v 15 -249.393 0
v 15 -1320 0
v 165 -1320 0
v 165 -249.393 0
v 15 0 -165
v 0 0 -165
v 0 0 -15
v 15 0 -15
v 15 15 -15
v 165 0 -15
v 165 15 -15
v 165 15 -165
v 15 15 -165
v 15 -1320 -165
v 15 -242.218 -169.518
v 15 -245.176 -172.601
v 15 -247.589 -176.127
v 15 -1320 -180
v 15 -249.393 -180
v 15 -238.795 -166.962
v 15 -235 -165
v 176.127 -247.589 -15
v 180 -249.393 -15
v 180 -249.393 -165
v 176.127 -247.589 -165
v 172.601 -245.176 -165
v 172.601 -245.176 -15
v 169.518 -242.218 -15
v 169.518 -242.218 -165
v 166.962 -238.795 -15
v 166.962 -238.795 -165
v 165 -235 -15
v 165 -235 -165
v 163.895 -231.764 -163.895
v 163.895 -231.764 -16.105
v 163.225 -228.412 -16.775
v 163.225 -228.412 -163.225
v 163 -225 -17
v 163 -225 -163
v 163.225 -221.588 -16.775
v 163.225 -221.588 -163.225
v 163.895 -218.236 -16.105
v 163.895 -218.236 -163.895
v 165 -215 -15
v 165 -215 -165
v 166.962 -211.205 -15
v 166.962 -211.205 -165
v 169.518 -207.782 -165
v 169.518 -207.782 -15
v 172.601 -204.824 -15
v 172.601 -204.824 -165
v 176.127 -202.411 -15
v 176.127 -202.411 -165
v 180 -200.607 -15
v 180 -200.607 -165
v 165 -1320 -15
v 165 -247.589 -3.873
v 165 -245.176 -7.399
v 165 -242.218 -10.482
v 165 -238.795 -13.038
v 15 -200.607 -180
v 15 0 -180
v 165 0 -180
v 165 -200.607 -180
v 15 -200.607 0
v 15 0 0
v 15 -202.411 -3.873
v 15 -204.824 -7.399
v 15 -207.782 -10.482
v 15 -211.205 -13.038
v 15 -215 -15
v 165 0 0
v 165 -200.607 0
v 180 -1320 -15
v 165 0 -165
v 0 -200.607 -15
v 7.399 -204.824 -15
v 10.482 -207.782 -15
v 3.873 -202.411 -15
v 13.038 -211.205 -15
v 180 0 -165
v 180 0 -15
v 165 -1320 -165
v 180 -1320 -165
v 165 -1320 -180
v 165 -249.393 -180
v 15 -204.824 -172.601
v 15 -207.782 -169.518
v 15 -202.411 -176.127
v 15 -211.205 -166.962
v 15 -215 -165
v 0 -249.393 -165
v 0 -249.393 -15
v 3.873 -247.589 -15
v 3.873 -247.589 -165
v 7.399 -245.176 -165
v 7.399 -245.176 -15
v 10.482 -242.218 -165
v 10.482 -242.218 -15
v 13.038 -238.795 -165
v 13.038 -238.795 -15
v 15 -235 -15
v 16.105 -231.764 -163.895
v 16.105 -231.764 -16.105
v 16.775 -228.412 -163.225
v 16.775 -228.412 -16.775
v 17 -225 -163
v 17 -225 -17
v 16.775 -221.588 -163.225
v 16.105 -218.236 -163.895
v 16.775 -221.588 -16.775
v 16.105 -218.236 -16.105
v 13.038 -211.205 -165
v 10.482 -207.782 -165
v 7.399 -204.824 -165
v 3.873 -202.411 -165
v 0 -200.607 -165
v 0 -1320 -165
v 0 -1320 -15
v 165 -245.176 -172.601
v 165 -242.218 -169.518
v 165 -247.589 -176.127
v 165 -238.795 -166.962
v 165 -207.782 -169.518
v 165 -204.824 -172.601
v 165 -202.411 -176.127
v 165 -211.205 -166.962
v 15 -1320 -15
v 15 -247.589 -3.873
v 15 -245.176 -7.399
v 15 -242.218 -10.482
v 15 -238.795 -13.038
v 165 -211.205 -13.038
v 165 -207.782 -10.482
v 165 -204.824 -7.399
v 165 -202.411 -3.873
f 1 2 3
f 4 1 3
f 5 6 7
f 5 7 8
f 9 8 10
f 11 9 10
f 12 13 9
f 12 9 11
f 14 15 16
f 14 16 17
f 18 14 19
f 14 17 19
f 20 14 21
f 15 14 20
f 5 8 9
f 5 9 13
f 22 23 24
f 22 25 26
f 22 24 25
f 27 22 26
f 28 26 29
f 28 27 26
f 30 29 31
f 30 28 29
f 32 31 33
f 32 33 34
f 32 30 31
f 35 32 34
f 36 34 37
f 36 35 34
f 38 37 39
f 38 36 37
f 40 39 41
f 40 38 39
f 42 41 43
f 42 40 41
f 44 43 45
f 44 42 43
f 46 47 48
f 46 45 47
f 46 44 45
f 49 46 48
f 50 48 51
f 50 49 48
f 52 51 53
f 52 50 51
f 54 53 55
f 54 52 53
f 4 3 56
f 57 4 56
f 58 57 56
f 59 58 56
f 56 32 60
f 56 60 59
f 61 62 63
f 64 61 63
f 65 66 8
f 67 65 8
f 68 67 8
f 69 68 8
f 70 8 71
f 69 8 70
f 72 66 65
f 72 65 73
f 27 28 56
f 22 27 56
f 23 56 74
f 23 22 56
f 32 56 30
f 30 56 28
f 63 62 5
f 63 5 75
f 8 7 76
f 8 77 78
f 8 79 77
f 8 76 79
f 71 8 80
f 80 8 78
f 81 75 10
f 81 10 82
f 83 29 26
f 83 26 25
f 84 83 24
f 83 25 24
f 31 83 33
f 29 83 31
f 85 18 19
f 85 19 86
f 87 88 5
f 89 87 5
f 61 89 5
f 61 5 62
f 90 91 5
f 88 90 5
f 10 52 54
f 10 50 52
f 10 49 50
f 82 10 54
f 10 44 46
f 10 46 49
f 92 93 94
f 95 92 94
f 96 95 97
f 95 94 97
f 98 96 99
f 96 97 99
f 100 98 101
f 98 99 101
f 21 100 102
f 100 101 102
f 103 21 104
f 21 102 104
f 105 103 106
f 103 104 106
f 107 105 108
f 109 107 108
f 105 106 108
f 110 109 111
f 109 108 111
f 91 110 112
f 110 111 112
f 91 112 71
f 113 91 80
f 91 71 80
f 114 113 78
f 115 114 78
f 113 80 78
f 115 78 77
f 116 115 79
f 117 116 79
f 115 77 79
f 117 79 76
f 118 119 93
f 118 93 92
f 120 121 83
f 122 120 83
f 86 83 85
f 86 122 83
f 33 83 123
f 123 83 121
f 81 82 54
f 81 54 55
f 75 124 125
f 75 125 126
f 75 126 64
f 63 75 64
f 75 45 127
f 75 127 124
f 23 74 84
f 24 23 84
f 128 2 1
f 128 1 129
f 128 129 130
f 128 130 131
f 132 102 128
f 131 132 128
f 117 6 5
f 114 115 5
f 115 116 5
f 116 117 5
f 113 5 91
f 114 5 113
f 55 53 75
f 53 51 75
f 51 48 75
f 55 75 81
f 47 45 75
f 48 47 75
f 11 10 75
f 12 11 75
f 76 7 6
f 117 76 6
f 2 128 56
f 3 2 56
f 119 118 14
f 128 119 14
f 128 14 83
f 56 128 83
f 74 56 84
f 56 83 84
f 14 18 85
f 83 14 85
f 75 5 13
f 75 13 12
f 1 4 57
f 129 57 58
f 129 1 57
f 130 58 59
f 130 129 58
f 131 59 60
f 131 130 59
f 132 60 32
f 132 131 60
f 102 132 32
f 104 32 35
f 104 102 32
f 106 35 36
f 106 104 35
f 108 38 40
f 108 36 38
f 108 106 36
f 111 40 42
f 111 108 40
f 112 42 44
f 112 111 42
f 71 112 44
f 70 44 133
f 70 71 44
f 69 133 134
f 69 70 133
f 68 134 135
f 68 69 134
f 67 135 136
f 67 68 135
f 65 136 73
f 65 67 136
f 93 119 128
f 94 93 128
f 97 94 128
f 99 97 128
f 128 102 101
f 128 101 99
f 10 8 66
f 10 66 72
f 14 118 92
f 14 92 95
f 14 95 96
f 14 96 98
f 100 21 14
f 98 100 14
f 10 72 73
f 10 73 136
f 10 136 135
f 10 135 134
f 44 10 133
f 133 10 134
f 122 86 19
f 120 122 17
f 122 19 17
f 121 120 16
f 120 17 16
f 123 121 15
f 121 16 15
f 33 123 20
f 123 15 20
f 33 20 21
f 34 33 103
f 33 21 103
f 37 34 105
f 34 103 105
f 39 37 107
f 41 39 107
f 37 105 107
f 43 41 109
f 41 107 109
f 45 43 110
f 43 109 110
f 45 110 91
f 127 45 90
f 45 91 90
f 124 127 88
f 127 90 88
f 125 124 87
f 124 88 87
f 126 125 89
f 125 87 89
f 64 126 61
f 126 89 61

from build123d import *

# Parameters (mm, degrees)
SKETCH_4_W               = 180
SKETCH_4_H               = 180
EXTRUDE_1_DEPTH          = 1320
SKETCH_5_W               = 15
SKETCH_5_H               = 15
CUT_EXTRUDE_1_DEPTH      = 1320
CUT_EXTRUDE_2_DEPTH      = 1
CUT_EXTRUDE_2_DEPTH_BACK = 181
CUT_EXTRUDE_3_DEPTH      = 181
SKETCH_8_W               = 150
SKETCH_8_H               = 150
EXTRUDE_2_DEPTH          = 15


with BuildPart() as part:
    # 草图4 → 凸台-拉伸1 (new body)
    with BuildSketch(Plane(origin=(0, 0, 0), x_dir=(1, 0, 0), z_dir=(0, 1, 0))):
        with Locations((90, 90)):
            Rectangle(SKETCH_4_W, SKETCH_4_H)
    extrude(amount=-EXTRUDE_1_DEPTH)

    # 草图5 → 切除-拉伸1 (cut)
    with BuildSketch(Plane(origin=(0, 0, 0), x_dir=(1, 0, 0), z_dir=(0, 1, 0))):
        with Locations((7.5, 172.5)):
            Rectangle(SKETCH_5_W, SKETCH_5_H)
        with Locations((7.5, 7.5)):
            Rectangle(SKETCH_5_W, SKETCH_5_H)
        with Locations((172.5, 172.5)):
            Rectangle(SKETCH_5_W, SKETCH_5_H)
        with Locations((172.5, 7.5)):
            Rectangle(SKETCH_5_W, SKETCH_5_H)
    extrude(amount=-CUT_EXTRUDE_1_DEPTH, mode=Mode.SUBTRACT)

    # 草图6 → 切除-拉伸2 (cut, two sides)
    with BuildSketch(Plane.XY) as cut_extrude_2_sk:
        with BuildLine():
            Line((0, -200.607378165), (0, -249.392621835))
            ThreePointArc((0, -249.392621835), (17, -225), (0, -200.607378165))
        make_face()
        with BuildLine():
            Line((180, -200.607378165), (180, -249.392621835))
            ThreePointArc((180, -249.392621835), (163, -225), (180, -200.607378165))
        make_face()
    extrude(amount=CUT_EXTRUDE_2_DEPTH, mode=Mode.SUBTRACT)
    extrude(cut_extrude_2_sk.sketch, amount=-CUT_EXTRUDE_2_DEPTH_BACK, mode=Mode.SUBTRACT)

    # 草图7 → 切除-拉伸3 (cut, through all)
    with BuildSketch(Plane.ZY):
        with BuildLine():
            Line((-180, -200.607378165), (-180, -249.392621835))
            ThreePointArc((-180, -249.392621835), (-163, -225), (-180, -200.607378165))
        make_face()
        with BuildLine():
            Line((0, -200.607378165), (0, -249.392621835))
            ThreePointArc((0, -249.392621835), (-17, -225), (0, -200.607378165))
        make_face()
    extrude(amount=-CUT_EXTRUDE_3_DEPTH, mode=Mode.SUBTRACT)

    # 草图8 → 凸台-拉伸2 (add)
    with BuildSketch(Plane(origin=(0, 0, 0), x_dir=(1, 0, 0), z_dir=(0, 1, 0))):
        with Locations((90, 90)):
            Rectangle(SKETCH_8_W, SKETCH_8_H)
    extrude(amount=EXTRUDE_2_DEPTH)


solid = part.part
